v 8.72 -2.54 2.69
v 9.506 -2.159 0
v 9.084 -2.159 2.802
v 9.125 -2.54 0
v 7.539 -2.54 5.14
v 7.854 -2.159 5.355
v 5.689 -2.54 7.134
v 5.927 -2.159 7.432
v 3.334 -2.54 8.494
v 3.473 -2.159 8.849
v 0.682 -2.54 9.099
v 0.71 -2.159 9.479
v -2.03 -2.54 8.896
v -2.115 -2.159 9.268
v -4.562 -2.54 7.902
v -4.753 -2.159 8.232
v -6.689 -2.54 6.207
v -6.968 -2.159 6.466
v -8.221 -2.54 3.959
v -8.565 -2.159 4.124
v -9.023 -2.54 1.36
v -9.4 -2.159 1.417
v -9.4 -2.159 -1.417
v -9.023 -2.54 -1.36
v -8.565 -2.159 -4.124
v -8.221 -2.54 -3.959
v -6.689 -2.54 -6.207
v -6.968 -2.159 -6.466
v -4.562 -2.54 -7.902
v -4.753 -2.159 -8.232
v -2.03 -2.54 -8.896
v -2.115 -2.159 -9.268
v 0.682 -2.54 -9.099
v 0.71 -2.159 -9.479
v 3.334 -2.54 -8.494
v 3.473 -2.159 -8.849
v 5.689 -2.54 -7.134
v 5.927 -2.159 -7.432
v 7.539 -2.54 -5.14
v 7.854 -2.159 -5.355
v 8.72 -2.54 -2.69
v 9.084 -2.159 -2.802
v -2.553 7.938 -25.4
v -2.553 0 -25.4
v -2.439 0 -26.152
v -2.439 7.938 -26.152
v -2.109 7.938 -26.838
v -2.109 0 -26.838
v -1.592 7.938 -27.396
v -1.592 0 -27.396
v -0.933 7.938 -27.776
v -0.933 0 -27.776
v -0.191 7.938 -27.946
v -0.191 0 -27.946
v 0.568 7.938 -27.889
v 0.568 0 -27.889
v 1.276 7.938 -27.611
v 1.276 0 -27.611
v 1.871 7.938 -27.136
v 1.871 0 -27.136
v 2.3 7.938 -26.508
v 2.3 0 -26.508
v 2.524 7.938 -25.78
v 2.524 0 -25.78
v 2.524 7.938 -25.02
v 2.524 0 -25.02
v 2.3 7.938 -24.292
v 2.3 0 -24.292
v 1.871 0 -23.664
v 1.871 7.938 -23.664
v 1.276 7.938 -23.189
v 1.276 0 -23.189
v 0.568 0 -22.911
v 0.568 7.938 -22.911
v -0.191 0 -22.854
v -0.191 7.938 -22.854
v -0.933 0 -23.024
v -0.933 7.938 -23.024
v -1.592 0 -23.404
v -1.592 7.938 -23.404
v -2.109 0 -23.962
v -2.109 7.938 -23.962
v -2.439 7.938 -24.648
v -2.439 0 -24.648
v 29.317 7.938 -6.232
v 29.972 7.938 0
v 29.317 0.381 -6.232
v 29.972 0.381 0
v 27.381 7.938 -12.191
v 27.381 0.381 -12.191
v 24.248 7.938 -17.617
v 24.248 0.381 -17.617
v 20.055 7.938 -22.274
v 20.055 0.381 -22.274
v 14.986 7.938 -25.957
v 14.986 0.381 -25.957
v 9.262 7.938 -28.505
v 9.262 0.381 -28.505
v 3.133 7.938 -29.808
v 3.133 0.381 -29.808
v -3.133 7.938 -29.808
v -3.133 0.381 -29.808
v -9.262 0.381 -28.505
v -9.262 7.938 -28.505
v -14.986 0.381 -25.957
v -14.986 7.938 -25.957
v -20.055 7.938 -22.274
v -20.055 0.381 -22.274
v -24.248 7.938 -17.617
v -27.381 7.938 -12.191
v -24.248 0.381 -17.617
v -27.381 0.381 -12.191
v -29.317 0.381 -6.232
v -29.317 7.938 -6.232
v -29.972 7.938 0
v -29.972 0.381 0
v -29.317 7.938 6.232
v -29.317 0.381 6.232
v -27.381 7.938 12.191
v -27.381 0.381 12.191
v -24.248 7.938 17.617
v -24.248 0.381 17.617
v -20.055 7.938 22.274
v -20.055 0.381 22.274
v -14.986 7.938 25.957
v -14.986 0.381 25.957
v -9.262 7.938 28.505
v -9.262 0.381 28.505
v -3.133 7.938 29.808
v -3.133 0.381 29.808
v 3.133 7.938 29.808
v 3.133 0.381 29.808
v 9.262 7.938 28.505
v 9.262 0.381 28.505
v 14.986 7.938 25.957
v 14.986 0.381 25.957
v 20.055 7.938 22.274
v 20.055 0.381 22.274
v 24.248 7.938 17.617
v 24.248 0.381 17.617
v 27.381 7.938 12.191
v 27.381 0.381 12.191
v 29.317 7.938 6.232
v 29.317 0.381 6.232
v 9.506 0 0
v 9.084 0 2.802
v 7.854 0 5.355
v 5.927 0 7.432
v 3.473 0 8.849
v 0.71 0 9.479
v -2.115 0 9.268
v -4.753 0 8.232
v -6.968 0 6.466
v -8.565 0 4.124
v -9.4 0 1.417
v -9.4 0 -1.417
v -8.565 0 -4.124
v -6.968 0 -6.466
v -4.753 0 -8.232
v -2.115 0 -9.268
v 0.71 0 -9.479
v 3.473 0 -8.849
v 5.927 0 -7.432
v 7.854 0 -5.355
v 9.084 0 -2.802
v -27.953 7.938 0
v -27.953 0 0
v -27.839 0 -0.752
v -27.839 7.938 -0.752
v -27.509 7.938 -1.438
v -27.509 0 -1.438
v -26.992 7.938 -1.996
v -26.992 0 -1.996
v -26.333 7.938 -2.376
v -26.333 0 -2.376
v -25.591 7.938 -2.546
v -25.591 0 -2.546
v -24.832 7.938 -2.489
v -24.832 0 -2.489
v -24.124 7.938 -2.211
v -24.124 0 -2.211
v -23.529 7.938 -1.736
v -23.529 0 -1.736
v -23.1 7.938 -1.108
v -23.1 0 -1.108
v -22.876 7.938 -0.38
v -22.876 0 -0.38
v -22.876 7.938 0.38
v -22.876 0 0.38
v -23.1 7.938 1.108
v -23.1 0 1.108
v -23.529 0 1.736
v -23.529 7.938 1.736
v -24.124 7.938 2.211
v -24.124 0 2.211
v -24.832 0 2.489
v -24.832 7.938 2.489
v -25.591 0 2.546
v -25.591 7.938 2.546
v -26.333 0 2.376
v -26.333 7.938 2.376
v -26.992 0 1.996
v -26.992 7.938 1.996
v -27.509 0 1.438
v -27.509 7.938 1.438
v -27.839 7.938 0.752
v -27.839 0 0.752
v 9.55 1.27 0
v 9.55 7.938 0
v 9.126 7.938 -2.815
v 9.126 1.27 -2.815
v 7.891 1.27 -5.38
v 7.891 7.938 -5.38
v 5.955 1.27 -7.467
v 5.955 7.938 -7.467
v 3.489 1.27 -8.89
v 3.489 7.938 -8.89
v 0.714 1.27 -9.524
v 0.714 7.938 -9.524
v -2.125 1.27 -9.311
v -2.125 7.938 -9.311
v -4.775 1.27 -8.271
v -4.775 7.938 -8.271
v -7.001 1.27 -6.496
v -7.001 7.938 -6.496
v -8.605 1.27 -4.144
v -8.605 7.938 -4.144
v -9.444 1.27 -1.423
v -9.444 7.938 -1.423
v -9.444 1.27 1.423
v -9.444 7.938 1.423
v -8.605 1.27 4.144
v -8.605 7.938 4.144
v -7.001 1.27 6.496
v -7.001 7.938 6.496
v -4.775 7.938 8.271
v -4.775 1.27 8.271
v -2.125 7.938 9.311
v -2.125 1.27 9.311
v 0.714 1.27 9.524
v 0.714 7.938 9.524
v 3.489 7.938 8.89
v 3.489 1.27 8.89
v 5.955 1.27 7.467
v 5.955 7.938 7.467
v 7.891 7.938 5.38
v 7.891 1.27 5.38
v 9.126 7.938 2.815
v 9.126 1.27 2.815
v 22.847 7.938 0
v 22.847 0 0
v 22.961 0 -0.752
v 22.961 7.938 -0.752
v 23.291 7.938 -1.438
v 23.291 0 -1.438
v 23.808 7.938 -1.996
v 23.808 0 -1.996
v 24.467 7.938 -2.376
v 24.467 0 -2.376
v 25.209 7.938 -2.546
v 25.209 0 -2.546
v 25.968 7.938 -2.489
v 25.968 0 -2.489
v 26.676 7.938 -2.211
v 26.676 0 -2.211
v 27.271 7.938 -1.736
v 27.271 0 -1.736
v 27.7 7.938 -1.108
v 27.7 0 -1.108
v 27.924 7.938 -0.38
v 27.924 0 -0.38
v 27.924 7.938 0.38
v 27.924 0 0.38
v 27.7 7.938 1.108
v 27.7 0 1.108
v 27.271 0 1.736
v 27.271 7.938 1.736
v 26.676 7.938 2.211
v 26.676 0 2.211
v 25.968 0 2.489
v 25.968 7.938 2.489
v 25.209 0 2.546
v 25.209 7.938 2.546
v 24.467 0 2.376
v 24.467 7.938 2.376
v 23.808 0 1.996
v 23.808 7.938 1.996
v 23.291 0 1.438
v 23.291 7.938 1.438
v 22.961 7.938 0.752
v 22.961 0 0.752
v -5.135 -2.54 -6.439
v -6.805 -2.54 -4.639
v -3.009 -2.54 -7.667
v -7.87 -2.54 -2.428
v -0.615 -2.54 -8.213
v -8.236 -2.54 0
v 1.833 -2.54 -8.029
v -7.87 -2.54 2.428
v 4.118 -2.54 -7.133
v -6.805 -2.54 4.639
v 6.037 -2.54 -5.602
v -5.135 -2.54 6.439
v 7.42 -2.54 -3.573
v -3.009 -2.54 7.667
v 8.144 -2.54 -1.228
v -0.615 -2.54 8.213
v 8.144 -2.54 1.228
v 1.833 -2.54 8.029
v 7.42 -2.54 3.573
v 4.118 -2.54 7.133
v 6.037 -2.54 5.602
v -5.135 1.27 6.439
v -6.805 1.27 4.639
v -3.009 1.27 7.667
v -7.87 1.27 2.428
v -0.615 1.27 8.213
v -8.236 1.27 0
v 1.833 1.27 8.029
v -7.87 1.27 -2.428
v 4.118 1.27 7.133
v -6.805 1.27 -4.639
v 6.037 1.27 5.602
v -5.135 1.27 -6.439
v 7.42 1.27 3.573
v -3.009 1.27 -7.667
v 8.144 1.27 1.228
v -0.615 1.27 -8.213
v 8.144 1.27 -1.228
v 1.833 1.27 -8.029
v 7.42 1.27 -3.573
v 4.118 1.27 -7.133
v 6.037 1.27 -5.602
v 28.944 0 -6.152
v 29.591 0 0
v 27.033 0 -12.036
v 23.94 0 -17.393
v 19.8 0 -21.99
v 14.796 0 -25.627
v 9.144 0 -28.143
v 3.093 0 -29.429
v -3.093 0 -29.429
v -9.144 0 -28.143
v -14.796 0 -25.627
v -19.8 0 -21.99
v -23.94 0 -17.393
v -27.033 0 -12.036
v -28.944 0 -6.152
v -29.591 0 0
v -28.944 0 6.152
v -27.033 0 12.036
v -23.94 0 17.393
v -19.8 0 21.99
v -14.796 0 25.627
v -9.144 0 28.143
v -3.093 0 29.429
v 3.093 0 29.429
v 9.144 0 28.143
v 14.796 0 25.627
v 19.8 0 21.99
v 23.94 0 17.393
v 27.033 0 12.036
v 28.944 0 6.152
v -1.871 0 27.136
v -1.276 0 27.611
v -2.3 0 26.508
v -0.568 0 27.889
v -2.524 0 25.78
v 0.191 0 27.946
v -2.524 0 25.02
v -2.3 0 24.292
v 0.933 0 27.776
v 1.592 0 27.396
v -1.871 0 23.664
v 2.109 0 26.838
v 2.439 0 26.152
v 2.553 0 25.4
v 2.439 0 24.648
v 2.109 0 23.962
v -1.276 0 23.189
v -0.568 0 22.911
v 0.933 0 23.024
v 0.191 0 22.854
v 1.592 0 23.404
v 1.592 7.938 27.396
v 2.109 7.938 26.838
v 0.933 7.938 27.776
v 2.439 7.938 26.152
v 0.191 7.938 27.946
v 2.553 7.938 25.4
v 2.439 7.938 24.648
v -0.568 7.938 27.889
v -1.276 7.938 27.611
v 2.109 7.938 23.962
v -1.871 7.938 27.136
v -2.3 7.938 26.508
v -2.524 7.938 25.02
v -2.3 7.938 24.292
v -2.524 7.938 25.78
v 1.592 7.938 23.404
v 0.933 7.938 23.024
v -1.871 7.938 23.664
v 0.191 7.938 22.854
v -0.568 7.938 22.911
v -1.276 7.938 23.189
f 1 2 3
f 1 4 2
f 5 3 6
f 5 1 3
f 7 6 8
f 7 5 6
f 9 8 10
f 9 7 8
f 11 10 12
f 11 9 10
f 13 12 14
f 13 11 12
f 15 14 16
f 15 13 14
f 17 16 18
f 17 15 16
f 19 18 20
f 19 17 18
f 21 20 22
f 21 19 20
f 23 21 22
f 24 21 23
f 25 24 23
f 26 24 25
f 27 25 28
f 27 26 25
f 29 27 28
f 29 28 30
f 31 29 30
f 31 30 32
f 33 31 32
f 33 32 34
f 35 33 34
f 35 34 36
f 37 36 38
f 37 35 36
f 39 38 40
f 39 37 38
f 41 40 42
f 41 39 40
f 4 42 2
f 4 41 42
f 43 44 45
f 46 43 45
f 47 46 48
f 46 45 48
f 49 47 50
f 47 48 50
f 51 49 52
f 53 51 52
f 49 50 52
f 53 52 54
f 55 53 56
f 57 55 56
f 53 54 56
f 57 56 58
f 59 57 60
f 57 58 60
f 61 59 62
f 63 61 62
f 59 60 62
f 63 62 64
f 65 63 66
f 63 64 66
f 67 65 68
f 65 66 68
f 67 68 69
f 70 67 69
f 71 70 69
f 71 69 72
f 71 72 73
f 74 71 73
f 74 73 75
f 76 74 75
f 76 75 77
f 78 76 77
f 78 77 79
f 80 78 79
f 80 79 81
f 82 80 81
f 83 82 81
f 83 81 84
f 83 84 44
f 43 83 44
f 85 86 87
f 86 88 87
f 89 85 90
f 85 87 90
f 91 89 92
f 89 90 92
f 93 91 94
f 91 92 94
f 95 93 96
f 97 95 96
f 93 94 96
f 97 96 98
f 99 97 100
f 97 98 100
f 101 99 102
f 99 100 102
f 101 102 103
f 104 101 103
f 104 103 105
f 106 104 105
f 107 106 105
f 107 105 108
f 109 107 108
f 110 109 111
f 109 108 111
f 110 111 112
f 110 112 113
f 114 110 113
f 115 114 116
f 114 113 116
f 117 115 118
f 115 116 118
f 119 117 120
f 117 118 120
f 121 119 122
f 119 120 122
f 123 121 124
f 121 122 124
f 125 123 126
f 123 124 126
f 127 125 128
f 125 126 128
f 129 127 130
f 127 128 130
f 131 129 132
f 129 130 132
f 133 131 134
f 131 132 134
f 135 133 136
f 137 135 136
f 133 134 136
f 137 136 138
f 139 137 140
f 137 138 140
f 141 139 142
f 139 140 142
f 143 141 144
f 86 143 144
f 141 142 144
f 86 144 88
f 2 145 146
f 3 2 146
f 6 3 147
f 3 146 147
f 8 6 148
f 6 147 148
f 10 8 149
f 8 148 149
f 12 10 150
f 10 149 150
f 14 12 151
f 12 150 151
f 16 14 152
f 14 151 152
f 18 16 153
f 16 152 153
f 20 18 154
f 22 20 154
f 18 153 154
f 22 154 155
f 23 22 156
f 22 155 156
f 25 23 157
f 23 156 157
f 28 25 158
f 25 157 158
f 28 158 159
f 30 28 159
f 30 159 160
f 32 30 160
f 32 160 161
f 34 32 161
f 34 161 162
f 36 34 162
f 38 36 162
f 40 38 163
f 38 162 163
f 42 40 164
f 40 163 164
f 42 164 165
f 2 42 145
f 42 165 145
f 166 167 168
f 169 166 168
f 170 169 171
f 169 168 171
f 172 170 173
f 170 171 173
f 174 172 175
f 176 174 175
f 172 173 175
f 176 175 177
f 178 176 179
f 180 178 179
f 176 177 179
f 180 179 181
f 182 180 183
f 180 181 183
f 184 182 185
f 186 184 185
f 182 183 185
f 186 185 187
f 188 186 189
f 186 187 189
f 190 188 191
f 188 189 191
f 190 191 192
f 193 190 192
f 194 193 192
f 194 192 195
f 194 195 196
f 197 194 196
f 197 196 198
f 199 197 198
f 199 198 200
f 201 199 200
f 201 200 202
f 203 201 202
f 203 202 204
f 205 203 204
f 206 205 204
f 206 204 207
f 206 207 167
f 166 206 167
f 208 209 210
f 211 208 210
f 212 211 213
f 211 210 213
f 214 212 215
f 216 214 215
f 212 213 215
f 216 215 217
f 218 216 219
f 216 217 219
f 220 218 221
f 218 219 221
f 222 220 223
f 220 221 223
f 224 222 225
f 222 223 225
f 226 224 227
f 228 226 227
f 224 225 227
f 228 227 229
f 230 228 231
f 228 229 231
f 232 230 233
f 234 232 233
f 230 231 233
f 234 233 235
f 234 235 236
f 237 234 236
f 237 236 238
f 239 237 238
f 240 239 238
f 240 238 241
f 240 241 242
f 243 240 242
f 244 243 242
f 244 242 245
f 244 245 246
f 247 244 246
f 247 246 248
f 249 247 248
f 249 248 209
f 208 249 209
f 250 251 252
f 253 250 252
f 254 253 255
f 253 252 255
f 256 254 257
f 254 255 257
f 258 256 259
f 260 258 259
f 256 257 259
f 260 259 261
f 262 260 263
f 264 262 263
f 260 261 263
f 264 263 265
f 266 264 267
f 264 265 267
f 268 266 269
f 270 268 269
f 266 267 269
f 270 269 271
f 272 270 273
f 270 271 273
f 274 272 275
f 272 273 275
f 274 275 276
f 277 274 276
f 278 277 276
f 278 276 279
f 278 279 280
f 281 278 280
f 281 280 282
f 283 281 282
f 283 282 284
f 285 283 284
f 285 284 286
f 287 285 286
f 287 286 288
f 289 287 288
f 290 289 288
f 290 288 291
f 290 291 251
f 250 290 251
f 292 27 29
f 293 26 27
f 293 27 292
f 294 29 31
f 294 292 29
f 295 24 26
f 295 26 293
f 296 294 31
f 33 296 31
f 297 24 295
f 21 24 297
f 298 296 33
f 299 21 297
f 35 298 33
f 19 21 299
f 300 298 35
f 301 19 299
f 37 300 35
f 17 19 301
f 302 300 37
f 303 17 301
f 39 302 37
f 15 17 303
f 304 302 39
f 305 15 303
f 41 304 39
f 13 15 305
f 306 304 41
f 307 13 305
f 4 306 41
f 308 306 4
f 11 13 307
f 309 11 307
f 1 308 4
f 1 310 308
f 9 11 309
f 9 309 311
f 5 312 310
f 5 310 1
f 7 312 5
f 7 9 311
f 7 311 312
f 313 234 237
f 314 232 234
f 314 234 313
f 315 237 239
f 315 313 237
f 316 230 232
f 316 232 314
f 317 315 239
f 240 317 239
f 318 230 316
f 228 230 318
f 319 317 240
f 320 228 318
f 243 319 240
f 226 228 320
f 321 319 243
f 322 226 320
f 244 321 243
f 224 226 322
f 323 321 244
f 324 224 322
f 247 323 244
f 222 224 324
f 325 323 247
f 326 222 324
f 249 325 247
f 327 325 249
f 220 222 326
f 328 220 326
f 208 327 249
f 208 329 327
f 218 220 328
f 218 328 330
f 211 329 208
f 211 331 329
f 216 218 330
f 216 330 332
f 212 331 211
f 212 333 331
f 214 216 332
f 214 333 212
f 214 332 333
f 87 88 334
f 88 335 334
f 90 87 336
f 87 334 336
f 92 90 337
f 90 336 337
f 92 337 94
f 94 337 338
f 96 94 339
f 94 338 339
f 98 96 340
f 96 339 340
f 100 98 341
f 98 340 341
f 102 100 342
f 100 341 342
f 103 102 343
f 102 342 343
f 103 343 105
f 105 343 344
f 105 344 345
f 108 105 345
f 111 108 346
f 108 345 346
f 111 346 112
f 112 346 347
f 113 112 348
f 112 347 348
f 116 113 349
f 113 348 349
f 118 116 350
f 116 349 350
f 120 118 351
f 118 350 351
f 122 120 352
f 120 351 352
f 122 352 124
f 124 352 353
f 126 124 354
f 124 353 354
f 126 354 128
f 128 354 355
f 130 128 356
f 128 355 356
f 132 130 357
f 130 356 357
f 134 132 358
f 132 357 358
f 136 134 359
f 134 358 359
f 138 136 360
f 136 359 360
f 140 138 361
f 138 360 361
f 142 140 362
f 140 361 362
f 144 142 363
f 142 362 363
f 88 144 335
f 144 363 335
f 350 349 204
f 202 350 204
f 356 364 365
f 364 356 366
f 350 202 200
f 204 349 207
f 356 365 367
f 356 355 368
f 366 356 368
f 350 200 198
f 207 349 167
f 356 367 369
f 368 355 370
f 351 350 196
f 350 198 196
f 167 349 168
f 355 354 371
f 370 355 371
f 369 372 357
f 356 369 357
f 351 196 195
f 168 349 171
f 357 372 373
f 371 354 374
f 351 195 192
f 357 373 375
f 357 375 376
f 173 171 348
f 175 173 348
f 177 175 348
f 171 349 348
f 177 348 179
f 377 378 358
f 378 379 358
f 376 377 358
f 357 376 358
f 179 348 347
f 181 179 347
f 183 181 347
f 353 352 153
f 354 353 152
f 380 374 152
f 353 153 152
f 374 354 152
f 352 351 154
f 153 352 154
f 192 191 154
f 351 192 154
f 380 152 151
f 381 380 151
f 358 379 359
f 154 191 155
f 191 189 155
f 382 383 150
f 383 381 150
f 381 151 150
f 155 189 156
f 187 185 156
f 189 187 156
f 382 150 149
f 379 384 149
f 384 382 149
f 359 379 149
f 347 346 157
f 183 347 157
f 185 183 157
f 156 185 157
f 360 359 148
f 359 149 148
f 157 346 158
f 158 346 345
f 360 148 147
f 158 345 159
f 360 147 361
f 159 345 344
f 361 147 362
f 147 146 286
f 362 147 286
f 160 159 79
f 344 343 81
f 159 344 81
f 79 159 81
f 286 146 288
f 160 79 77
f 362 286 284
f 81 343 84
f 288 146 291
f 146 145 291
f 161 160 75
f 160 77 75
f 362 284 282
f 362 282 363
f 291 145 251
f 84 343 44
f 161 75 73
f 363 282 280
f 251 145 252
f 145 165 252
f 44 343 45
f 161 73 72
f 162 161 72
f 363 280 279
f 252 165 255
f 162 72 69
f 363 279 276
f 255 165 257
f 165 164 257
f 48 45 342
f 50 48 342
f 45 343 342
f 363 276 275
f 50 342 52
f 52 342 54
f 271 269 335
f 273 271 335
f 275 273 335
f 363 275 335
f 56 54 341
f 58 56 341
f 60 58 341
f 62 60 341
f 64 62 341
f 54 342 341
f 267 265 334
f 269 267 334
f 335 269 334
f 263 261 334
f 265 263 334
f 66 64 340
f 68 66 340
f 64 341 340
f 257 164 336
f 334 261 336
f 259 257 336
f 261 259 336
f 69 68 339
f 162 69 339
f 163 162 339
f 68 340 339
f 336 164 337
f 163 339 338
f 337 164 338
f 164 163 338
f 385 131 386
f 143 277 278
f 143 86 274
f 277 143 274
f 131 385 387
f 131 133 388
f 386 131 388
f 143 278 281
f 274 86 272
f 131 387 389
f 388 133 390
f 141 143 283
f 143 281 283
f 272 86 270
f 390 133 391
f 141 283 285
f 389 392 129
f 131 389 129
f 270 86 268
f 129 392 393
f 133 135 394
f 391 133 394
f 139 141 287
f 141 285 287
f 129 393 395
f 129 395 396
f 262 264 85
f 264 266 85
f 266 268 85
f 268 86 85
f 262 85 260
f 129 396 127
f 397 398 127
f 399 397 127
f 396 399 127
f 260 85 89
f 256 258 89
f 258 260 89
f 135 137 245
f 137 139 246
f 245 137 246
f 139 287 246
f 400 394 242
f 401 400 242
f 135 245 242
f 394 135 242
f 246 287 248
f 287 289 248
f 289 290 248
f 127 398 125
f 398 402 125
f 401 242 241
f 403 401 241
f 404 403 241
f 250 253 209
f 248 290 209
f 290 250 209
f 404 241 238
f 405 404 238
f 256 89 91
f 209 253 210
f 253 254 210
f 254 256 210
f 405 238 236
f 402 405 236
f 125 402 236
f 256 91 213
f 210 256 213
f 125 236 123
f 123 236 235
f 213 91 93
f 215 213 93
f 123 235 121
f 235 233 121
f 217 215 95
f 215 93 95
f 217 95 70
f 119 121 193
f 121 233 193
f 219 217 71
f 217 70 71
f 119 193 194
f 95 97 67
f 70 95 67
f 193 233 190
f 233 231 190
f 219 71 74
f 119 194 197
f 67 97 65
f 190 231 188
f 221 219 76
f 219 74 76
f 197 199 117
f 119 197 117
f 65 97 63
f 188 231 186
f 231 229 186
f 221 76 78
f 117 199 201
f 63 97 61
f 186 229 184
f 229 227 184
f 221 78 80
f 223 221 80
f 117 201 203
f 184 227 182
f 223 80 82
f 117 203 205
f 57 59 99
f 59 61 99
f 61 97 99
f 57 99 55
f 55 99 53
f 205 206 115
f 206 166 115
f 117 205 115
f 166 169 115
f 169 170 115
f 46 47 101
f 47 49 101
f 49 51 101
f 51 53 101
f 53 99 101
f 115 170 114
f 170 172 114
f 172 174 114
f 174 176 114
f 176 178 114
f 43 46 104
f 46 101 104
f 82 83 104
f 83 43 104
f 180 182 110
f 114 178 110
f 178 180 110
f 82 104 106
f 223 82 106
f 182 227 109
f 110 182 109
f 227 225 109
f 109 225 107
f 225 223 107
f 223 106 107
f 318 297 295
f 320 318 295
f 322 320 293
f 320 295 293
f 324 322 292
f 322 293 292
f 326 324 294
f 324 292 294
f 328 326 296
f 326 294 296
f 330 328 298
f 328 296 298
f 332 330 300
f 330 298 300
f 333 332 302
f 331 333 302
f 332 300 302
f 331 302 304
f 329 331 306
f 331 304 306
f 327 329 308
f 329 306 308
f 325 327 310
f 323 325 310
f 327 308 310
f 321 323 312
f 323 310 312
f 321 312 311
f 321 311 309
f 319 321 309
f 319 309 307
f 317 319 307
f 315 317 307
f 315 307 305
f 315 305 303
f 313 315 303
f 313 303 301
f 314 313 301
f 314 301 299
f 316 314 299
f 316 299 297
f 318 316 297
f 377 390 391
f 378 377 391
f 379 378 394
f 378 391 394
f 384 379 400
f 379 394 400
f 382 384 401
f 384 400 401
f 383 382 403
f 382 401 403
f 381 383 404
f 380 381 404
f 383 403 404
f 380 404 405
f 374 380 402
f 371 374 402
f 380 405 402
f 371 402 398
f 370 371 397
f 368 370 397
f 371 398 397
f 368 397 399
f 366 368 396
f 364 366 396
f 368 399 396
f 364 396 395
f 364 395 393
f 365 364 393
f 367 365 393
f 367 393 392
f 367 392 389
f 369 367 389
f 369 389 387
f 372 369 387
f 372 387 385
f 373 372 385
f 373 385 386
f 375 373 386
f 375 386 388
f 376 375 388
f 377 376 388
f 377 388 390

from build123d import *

# Parameters (mm, degrees)
SKETCH2_R                                = 9.50595
BOSS_EXTRUDE1_DEPTH                      = 2.159
SKETCH3_R                                = 9.50595
BOSS_EXTRUDE2_DEPTH                      = 0.381
BOSS_EXTRUDE2_TAPER                      = 45
HOLE1_D                                  = 5.1054
HOLE1_DEPTH                              = 7.9375
HOLE2_D                                  = 5.1054
HOLE2_DEPTH                              = 10.4775
CBORE_FOR_M14_HEX_HEAD_BOLT1_D           = 16.4719
CBORE_FOR_M14_HEX_HEAD_BOLT1_DEPTH       = 10.4775
CBORE_FOR_M14_HEX_HEAD_BOLT1_CBORE_D     = 19.1008
CBORE_FOR_M14_HEX_HEAD_BOLT1_CBORE_DEPTH = 6.6675


with BuildPart() as part:
    # Sketch1 → Revolve1 (revolve)
    with BuildSketch(Plane(origin=(0, 0, 0), x_dir=(-1, 0, 0), z_dir=(0, 0, -1))):
        Polygon((-29.591, 0), (0, 0), (0, 7.9375), (-29.972, 7.9375), (-29.972, 0.381), align=None)
    revolve(axis=Axis((0, 0, 0), (0, 1, 0)))

    # Sketch2 → Boss-Extrude1 (add)
    with BuildSketch(Plane.XZ):
        Circle(SKETCH2_R)
    extrude(amount=BOSS_EXTRUDE1_DEPTH)

    # Sketch3 → Boss-Extrude2 (add)
    with BuildSketch(Plane.XZ.offset(2.159)):
        Circle(SKETCH3_R)
    extrude(amount=BOSS_EXTRUDE2_DEPTH, taper=BOSS_EXTRUDE2_TAPER)

    # Hole1
    with Locations(Plane(origin=(0, 0, 0), x_dir=(-1, 0, 0), z_dir=(0, -1, 0))):
        with Locations((0, -25.4)):
            Hole(HOLE1_D / 2, depth=HOLE1_DEPTH)

    # Hole2
    with Locations(Plane(origin=(0, 7.9375, 0), x_dir=(1, 0, 0), z_dir=(0, 1, 0))):
        with Locations((0, 25.4), (25.4, 0), (-25.4, 0)):
            Hole(HOLE2_D / 2, depth=HOLE2_DEPTH)

    # CBORE for M14 Hex Head Bolt1
    with Locations(Plane(origin=(0, 7.9375, 0), x_dir=(1, 0, 0), z_dir=(0, 1, 0))):
        with Locations((0, 0)):
            CounterBoreHole(CBORE_FOR_M14_HEX_HEAD_BOLT1_D / 2, CBORE_FOR_M14_HEX_HEAD_BOLT1_CBORE_D / 2, CBORE_FOR_M14_HEX_HEAD_BOLT1_CBORE_DEPTH, depth=CBORE_FOR_M14_HEX_HEAD_BOLT1_DEPTH)


solid = part.part
